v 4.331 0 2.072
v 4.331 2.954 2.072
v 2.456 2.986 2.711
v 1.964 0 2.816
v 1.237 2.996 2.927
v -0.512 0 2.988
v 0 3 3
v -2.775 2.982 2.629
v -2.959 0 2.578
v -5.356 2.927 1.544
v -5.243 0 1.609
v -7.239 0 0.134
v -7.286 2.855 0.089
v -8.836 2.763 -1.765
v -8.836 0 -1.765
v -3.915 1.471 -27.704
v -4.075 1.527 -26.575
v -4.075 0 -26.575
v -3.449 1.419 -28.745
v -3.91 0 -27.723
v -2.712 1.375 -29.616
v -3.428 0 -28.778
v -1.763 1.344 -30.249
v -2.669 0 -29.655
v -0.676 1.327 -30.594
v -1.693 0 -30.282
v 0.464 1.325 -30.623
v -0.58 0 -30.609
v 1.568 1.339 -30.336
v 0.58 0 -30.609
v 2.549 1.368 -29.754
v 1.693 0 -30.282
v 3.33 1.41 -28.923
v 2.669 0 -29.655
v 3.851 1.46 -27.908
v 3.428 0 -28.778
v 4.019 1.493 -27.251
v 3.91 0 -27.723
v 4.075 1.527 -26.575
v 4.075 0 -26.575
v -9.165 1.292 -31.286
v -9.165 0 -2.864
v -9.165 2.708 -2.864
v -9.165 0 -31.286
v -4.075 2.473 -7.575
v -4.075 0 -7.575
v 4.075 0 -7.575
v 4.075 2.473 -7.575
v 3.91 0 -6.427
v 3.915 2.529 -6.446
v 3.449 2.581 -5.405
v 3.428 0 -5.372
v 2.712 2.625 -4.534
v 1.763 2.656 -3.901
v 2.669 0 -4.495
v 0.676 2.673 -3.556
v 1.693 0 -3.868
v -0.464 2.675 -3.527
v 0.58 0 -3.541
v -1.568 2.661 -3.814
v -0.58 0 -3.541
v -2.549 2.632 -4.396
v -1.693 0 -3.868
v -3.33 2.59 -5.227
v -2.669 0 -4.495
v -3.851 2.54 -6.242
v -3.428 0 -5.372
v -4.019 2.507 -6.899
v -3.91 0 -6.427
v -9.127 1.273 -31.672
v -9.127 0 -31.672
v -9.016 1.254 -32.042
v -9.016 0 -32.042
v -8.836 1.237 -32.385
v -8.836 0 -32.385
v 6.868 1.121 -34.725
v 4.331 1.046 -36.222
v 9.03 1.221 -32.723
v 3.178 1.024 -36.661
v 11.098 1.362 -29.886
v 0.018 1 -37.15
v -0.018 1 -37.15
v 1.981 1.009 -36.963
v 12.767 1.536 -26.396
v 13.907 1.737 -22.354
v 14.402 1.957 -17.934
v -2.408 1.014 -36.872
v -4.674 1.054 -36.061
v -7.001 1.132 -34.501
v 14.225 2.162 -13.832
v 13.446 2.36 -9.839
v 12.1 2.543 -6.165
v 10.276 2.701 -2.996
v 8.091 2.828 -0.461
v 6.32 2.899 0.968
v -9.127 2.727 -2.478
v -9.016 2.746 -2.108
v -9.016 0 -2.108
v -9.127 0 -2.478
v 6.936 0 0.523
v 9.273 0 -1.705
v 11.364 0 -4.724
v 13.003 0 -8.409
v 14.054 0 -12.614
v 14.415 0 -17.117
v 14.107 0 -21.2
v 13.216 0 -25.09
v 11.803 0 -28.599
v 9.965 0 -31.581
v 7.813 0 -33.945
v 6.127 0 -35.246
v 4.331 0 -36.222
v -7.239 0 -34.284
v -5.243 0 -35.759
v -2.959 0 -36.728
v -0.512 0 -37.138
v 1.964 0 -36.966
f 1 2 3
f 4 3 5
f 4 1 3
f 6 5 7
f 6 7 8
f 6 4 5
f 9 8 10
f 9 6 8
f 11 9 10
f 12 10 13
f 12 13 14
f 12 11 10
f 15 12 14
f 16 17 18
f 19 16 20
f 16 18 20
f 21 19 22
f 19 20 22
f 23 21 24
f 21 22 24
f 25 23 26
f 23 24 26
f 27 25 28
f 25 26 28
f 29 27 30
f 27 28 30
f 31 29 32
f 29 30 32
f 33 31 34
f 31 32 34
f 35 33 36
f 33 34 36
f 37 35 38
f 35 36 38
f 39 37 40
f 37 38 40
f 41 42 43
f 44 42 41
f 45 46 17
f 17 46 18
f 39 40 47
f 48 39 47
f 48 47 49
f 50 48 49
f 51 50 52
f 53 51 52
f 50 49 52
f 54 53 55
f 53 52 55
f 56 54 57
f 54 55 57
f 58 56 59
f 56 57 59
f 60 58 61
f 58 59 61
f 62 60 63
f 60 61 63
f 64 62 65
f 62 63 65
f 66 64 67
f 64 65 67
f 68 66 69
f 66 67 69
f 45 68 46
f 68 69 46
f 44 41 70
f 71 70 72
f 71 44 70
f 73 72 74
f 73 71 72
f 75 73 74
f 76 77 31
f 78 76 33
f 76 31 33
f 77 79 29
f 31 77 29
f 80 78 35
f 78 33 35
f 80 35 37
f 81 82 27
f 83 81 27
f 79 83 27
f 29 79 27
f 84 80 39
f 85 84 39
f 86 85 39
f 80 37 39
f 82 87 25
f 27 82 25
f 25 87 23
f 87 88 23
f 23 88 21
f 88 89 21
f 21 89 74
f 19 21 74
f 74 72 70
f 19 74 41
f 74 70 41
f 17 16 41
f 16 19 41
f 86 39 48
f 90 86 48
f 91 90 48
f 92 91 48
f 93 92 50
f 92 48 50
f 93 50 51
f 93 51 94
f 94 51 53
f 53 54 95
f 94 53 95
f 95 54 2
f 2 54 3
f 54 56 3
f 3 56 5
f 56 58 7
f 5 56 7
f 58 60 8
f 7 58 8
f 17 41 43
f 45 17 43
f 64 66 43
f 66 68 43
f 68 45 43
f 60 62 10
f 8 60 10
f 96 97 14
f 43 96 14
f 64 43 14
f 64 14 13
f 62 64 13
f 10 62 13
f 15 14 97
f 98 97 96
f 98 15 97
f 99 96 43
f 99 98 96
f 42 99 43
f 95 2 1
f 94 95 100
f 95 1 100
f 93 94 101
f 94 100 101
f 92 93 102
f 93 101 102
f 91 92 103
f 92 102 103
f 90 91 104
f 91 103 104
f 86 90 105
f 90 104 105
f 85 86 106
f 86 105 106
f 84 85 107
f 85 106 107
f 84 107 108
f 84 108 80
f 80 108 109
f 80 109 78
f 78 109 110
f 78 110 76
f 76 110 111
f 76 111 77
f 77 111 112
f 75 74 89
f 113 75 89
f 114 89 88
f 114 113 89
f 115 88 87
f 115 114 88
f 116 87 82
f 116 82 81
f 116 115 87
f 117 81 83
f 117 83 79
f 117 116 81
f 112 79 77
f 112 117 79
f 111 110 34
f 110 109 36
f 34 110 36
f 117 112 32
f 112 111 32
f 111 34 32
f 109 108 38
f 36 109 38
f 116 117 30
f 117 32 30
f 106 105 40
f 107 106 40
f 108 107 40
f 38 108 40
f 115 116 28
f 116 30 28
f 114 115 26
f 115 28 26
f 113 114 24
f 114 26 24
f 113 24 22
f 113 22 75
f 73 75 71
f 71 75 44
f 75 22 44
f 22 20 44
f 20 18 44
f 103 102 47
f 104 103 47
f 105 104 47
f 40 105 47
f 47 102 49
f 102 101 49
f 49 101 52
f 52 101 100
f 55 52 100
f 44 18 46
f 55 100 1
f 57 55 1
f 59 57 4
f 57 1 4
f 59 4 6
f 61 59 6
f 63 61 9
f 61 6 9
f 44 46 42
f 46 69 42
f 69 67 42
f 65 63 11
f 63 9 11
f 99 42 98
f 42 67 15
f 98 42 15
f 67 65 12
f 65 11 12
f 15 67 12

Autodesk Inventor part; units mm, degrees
ref_plane "YZ Plane" through (0, 0, 0) normal (1, 0, 0) x (0, 1, 0)
ref_plane "XZ Plane" through (0, 0, 0) normal (0, 1, 0) x (-1, 0, 0)
ref_plane "XY Plane" through (0, 0, 0) normal (0, 0, 1) x (1, 0, 0)
sketch "Sketch1" plane through (0, 0, 0) normal (0, 1, 0) x (-1, 0, 0)
  line L0 (0, 0) -> (0, -34.15) construction
  arc A0 (6.6649, -3.975) -> (-7.575, -7.575) centre (0, -7.575) ccw construction
  arc A1 (-7.575, -26.575) -> (6.6649, -30.175) centre (0, -26.575) ccw construction
  line L1 (4.075, -7.575) -> (4.075, -26.575) construction
  arc A2 (-4.075, -26.575) -> (4.075, -26.575) centre (0, -26.575) ccw construction
  line L2 (-4.075, -26.575) -> (-4.075, -7.575) construction
  arc A3 (4.075, -7.575) -> (-4.075, -7.575) centre (0, -7.575) ccw construction
  line L3 (9.1649, -3.975) -> (9.1649, -30.175) construction
  line L4 (9.1649, -3.975) -> (6.6649, -3.975) construction
  line L5 (9.1649, -30.175) -> (6.6649, -30.175) construction
  line L6 (-10.575, -14.075) -> (-10.575, -20.075) construction
  line L7 (0, -17.075) -> (-19.3792, -17.075) construction
  line L8 (-4.075, -20.075) -> (-4.075, -24.075) construction
  line L9 (-10.575, -20.075) -> (-7.575, -21.8932) construction
  line L10 (-10.575, -14.075) -> (-7.575, -12.2568) construction
  line L11 (-7.575, -7.575) -> (-7.575, -12.2568) construction
  line L12 (-7.575, -21.8932) -> (-7.575, -26.575) construction
  line L13 (-10.575, -17.075) -> (-16.875, -17.075) construction
  line L14 (-10.575, -14.075) -> (-14.875, -14.075) construction
  line L15 (-16.875, -16.075) -> (-16.875, -18.075) construction
  line L16 (-14.875, -20.075) -> (-10.575, -20.075) construction
  arc A4 (-14.875, -14.075) -> (-16.875, -16.075) centre (-14.875, -16.075) ccw construction
  arc A5 (-16.875, -18.075) -> (-14.875, -20.075) centre (-14.875, -18.075) ccw construction
  line L17 (-6.7059, -17.075) -> (-6.7059, -23.075) construction
  line L18 (-6.7059, -17.075) -> (-6.7059, -11.075) construction
  line L19 (-7.575, -11.075) -> (-14.875, -11.075) construction
  line L20 (-16.875, -13.075) -> (-16.875, -21.075) construction
  line L21 (-14.875, -23.075) -> (-7.575, -23.075) construction
  arc A6 (-14.875, -11.075) -> (-16.875, -13.075) centre (-14.875, -13.075) ccw construction
  arc A7 (-16.875, -21.075) -> (-14.875, -23.075) centre (-14.875, -21.075) ccw construction
  line L22 (19.3047, -16.075) -> (19.3047, -18.075) construction
  line L23 (17.3047, -14.075) -> (13.3047, -14.075) construction
  line L24 (17.3047, -20.075) -> (13.3047, -20.075) construction
  line L25 (9.1649, -16.075) -> (9.1649, -22.575) construction
  line L26 (9.1649, -17.075) -> (9.1649, -11.575) construction
  line L27 (9.1649, -11.575) -> (13.3047, -14.075) construction
  line L28 (9.1649, -22.575) -> (13.3047, -20.075) construction
  arc A8 (19.3047, -16.075) -> (17.3047, -14.075) centre (17.3047, -16.075) ccw construction
  arc A9 (17.3047, -20.075) -> (19.3047, -18.075) centre (17.3047, -18.075) ccw construction
  line L29 (9.1649, -30.175) -> (9.1649, -26.175) construction
  line L30 (9.1649, -3.975) -> (9.1649, -7.975) construction
  line L31 (9.1649, -24.9114) -> (13.8618, -22.075) construction
  line L32 (13.8618, -22.075) -> (17.3047, -22.075) construction
  arc A10 (17.3047, -22.075) -> (21.3047, -18.075) centre (17.3047, -18.075) ccw construction
  line L33 (21.3047, -18.075) -> (21.3047, -16.075) construction
  arc A11 (21.3047, -16.075) -> (17.3047, -12.075) centre (17.3047, -16.075) ccw construction
  line L34 (17.3047, -12.075) -> (13.8618, -12.075) construction
  line L35 (13.8618, -12.075) -> (9.1649, -9.2386) construction
  point P0 (7.575, -17.075)
  point P1 (-4.075, -10.075)
  point P2 (19.3047, -14.075)
  point P3 (19.3047, -20.075)
  dimension "d0" = 34.15
  dimension "d1" = 15.15
  dimension "d5" = 6
  dimension "d7" = 4
  dimension "d8" = 2.5
  dimension "d9" = 3.5
  dimension "d10" = 8.15
  dimension "d12" = 2
  dimension "d14" = 6
  dimension "d15" = 6
  dimension "d16" = 2
  dimension "d18" = 6
  dimension "d19" = 6
  dimension "d20" = 5.5
  dimension "d21" = 5.5
  dimension "d23" = 4
  dimension "d24" = 4
  dimension "d25" = 2
sketch "Sketch3" plane through (0, 0, 0) normal (0, 1, 0) x (-1, 0, 0)
  arc A0 (6.6649, -3.975) -> (-7.575, -7.575) centre (0, -7.575) ccw construction
  arc A1 (-7.575, -26.575) -> (6.6649, -30.175) centre (0, -26.575) ccw construction
  arc A2 (-4.075, -26.575) -> (4.075, -26.575) centre (0, -26.575) ccw projected
  line L0 (4.075, -7.575) -> (4.075, -26.575) projected
  arc A3 (4.075, -7.575) -> (-4.075, -7.575) centre (0, -7.575) ccw projected
  line L1 (-4.075, -26.575) -> (-4.075, -7.575) projected
  line L2 (9.1649, -3.975) -> (9.1649, -30.175) construction
  line L3 (-10.575, -14.075) -> (-10.575, -20.075) construction
  line L4 (-16.875, -16.075) -> (-16.875, -18.075) construction
  arc A4 (8.836, -1.765) -> (-4.3309, 2.0725) centre (0, -7.575) ccw
  arc A5 (-4.3309, -36.2225) -> (8.836, -32.385) centre (0, -26.575) ccw
  line L5 (9.1649, -2.8638) -> (9.1649, -31.2862)
  arc A6 (9.1649, -2.8638) -> (8.836, -1.765) centre (7.1649, -2.8638) ccw
  arc A7 (8.836, -32.385) -> (9.1649, -31.2862) centre (7.1649, -31.2862) ccw
  line L6 (-12.075, -10.8843) -> (-12.075, -24.6972)
  ellipse E0 centre (0, -17.075) end of major axis (0, -37.15) minor radius 14.4147 (-4.3309, 2.0725) -> (-4.3309, -36.2225) ccw
  point P0 (0, 0)
  point P1 (9.1649, -2.2991)
  point P2 (9.1649, -31.8509)
  dimension "d26" = 3
  dimension "d27" = 3
  dimension "d28" = 2
  dimension "d29" = 6.5
  dimension "d30" = 8
extrude "Extrusion1" add sketch "Sketch3" along normal blind 3
ref_plane "Work Plane1" through (0, 1, 3) normal (1, 0, 0) x (0, 0, -1)
sketch "Sketch8" plane through (0, 1, 3) normal (1, 0, 0) x (0, 0, -1)
  line L0 (40.15, 2) -> (40.15, -1) projected
  line L1 (40.15, -1) -> (33.65, -1) projected
  line L2 (33.65, -1) -> (33.65, 2) projected
  line L3 (33.65, 2) -> (40.15, 2) projected
  line L4 (0, -1) -> (0, 2) projected
  line L5 (0, 2) -> (6.5, 2) projected
  line L6 (6.5, 2) -> (6.5, -1) projected
  line L7 (6.5, -1) -> (0, -1) projected
  line L8 (40.15, -1) -> (40.15, 0)
  line L9 (40.15, -1) -> (40.15, 2) projected
  line L10 (40.15, 0) -> (0, 2)
  line L11 (4.765, 2) -> (0, 2) projected
  line L12 (40.15, 2) -> (35.385, 2) projected
  line L13 (0, 2) -> (40.15, 2)
  line L14 (40.15, 2) -> (40.15, 0)
  point P0 (3, -1)
  point P1 (0.9275, 2)
  point P2 (39.2225, 2)
  dimension "d38" = 1
extrude "Extrusion3" cut sketch "Sketch8" along normal blind 30 and the other way blind 30 contours L0 L10 L2 L3 | L10 L6 L13 L2 | L10 L5 L6
properties part number "SPD_MTB_cleat_new_3mm_01mm"
